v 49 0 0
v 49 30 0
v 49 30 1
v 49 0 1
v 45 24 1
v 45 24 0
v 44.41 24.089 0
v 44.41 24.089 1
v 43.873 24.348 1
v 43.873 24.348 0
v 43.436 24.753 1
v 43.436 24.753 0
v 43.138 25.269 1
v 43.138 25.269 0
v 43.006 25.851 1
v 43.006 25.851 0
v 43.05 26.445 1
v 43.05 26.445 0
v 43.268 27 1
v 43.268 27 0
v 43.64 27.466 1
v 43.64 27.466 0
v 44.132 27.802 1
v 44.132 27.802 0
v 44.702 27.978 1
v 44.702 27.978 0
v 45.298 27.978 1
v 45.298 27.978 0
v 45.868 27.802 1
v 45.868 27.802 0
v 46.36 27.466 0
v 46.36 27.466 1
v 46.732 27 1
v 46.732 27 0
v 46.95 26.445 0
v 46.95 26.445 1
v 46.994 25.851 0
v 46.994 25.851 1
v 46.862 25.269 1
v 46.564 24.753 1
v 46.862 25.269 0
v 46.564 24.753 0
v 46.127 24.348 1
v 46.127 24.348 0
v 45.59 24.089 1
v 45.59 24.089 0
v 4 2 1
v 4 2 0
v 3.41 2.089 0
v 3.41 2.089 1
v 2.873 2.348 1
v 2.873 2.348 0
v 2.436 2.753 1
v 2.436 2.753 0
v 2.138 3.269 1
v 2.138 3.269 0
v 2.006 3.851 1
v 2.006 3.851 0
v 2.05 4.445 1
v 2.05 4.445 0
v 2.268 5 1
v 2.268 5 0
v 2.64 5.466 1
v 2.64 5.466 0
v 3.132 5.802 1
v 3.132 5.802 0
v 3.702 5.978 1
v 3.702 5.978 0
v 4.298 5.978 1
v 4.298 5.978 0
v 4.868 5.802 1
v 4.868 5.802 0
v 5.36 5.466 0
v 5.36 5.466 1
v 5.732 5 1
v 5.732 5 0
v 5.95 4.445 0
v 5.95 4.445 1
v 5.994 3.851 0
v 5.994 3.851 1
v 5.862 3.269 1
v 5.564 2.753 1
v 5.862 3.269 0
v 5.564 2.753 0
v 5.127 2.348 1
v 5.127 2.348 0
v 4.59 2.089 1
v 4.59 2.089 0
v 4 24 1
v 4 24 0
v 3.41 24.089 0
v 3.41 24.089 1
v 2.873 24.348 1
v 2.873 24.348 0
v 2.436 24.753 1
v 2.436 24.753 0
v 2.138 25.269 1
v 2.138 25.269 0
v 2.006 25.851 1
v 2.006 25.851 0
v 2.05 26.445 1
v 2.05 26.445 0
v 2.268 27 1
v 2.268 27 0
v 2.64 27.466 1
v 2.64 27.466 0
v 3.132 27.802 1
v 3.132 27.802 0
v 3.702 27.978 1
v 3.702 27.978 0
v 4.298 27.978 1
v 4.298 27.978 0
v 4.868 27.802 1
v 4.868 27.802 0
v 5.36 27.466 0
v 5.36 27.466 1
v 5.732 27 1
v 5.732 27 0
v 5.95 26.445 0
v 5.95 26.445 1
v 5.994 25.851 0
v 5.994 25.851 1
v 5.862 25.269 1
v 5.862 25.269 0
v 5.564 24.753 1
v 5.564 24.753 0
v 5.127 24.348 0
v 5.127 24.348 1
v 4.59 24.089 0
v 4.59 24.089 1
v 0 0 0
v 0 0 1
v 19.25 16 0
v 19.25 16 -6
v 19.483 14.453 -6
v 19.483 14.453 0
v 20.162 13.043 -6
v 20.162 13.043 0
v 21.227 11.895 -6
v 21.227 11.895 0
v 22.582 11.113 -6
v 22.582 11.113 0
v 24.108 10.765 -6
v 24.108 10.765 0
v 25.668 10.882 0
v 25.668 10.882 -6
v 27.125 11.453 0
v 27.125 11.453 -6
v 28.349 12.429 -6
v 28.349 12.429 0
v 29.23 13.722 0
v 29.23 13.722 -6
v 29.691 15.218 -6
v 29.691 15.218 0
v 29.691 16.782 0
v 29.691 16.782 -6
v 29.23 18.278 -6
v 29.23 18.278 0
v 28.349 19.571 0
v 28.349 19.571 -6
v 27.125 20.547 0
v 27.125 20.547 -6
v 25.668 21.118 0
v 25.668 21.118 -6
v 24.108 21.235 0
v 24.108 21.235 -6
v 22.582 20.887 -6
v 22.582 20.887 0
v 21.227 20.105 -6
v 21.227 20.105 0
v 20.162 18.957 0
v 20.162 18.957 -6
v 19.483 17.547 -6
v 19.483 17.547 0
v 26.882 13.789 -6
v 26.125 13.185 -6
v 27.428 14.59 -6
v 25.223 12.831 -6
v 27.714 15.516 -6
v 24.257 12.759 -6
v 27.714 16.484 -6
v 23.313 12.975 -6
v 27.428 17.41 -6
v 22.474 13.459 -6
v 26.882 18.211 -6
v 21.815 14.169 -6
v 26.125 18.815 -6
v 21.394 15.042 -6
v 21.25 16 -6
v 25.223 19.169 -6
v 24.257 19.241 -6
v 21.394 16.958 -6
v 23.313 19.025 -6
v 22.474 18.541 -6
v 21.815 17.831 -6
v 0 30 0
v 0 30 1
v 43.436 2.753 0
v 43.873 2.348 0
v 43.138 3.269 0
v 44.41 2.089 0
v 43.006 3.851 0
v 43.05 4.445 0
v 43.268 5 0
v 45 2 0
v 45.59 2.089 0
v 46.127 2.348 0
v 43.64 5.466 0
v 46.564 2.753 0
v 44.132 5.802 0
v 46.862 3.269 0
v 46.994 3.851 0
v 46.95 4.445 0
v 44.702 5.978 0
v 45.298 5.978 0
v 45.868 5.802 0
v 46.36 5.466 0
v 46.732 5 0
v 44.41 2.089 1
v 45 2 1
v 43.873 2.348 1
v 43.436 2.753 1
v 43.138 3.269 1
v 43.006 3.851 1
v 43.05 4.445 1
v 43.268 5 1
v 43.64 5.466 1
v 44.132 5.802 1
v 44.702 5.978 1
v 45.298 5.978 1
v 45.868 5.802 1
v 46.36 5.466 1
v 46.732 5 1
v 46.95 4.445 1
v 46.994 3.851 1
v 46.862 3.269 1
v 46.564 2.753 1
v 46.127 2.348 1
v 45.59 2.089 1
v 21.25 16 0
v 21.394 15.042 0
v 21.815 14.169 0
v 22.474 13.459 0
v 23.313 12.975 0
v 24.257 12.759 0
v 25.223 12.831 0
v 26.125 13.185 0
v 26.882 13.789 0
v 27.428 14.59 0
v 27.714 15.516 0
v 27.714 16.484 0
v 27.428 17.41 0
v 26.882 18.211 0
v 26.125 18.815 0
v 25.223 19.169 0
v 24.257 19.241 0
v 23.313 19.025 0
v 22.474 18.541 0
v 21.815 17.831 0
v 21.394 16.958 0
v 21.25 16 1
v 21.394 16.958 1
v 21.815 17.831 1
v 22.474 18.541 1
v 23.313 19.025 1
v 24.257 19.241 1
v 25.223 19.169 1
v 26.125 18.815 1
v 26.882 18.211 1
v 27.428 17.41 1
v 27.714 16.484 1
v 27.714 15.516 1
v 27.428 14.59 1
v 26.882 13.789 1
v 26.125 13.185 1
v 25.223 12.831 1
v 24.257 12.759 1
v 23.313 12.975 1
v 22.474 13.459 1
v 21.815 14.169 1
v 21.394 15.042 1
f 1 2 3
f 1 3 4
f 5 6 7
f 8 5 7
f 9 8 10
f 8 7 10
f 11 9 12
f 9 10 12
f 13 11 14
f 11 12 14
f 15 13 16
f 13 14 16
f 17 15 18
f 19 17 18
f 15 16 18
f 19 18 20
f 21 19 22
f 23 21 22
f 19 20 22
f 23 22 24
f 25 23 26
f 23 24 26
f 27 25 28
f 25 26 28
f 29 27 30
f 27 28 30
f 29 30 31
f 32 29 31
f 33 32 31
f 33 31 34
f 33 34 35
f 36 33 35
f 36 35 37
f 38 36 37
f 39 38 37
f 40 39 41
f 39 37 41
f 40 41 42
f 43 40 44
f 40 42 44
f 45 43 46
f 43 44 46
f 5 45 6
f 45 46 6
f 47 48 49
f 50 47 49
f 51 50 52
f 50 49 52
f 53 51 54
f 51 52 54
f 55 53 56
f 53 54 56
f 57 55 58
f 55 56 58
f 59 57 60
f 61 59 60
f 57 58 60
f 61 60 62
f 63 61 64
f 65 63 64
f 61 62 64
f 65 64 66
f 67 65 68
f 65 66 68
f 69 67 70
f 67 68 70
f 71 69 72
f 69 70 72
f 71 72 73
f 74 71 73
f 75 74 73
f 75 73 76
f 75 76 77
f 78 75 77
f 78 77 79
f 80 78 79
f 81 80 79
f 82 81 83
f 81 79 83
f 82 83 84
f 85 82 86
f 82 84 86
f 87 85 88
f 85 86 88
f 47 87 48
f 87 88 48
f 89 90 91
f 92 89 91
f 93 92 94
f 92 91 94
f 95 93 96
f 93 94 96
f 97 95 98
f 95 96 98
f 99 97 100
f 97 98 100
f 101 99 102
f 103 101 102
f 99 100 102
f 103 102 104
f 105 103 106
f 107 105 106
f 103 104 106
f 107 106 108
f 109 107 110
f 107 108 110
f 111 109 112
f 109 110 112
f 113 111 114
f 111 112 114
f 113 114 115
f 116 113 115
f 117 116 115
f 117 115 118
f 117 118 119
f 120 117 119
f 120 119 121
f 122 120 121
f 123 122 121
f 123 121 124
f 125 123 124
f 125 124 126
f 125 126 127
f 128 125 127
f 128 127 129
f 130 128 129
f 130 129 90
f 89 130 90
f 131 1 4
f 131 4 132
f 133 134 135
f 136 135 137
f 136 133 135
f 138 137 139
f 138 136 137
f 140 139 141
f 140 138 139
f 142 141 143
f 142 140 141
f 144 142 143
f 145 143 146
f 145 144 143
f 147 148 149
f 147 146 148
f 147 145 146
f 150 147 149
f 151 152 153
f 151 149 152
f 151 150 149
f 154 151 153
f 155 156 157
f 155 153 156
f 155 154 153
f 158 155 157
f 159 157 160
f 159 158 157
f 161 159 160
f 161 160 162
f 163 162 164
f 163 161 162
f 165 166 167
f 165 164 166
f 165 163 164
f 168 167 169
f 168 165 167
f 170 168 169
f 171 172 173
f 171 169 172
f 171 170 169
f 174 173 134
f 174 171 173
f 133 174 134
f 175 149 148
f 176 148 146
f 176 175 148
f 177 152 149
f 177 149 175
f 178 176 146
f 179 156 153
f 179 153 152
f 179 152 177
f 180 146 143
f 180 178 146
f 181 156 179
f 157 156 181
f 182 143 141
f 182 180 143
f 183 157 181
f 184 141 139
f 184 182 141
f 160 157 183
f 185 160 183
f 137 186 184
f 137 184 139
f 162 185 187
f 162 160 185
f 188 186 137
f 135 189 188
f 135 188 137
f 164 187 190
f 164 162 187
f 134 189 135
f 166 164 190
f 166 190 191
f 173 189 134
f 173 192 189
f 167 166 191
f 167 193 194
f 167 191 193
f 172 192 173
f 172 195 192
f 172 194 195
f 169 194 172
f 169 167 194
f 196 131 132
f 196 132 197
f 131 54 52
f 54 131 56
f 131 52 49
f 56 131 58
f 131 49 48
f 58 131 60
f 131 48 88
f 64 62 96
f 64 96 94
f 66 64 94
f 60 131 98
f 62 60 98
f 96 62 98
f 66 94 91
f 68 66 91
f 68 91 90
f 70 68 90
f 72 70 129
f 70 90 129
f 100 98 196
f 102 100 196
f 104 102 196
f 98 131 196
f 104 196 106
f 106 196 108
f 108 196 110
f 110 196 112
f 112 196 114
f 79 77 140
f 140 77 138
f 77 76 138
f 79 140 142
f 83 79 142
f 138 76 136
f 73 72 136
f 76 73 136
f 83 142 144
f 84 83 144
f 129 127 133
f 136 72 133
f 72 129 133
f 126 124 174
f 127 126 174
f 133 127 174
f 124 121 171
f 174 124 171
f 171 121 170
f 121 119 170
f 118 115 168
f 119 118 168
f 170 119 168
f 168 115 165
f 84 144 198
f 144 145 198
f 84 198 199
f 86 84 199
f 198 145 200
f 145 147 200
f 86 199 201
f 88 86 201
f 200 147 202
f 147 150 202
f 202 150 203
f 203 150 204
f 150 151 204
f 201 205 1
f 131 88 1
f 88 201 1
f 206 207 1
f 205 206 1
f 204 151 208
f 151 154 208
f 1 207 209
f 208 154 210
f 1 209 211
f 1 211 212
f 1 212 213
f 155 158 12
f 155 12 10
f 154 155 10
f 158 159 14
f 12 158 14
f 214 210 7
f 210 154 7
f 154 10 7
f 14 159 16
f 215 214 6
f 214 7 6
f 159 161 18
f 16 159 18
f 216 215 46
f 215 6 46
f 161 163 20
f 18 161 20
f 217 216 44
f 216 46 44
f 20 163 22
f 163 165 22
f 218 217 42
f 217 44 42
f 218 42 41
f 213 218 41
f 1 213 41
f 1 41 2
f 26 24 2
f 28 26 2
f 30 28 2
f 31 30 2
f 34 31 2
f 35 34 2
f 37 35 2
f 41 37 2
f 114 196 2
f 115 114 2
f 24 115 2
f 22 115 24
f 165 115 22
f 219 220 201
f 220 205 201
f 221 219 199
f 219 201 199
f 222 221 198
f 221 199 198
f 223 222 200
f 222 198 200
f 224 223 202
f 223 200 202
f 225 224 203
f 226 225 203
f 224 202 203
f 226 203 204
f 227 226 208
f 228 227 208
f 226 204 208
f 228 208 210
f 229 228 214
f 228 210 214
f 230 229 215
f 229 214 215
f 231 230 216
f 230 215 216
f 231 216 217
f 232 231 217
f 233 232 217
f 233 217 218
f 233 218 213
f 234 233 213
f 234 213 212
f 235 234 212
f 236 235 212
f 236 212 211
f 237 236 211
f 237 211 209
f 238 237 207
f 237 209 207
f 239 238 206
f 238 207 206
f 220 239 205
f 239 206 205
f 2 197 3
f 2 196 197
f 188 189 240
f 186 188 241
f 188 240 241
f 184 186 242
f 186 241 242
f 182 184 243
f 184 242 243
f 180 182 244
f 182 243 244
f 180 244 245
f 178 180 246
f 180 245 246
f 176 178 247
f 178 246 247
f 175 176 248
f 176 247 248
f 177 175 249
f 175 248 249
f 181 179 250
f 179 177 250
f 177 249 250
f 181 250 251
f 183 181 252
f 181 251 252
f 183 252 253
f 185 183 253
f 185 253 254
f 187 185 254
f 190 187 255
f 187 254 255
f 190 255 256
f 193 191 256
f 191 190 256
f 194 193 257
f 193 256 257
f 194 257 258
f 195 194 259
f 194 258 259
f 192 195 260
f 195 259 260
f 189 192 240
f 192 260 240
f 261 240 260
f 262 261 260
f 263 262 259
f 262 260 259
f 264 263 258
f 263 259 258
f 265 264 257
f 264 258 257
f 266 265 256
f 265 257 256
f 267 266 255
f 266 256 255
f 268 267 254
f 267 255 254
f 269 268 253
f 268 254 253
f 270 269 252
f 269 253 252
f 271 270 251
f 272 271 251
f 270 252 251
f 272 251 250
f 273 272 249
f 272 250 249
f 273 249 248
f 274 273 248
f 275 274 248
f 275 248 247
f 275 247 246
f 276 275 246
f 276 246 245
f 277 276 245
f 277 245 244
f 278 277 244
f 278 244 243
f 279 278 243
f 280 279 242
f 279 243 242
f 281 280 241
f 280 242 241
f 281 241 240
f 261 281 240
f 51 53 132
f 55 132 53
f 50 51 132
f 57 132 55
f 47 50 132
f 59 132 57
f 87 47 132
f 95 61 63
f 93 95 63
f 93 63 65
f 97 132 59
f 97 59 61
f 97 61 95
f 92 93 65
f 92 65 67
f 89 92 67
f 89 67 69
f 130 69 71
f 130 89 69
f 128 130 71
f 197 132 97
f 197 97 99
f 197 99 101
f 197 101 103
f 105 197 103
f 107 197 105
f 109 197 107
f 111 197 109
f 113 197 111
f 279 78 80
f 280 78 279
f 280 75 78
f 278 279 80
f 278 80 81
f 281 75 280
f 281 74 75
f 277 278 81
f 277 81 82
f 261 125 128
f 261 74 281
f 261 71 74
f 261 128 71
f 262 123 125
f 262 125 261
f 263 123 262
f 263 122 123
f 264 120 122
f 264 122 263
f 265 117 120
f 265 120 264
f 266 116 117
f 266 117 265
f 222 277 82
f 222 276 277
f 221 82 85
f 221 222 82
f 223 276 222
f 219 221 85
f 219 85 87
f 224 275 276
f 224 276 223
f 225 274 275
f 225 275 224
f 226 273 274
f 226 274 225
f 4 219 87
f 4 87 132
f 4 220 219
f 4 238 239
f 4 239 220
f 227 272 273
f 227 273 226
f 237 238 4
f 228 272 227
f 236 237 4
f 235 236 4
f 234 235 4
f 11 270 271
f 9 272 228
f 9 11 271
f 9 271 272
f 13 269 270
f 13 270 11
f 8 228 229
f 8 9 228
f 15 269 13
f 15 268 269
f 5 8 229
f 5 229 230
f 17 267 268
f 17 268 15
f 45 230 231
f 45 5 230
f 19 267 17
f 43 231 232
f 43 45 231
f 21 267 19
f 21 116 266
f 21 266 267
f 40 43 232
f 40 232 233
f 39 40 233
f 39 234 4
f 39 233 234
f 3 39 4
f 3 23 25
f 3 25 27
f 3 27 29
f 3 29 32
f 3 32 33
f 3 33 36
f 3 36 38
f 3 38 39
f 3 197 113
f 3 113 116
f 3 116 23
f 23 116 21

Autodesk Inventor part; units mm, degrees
ref_plane "YZ Plane" through (0, 0, 0) normal (1, 0, 0) x (0, 1, 0)
ref_plane "XZ Plane" through (0, 0, 0) normal (0, 1, 0) x (-1, 0, 0)
ref_plane "XY Plane" through (0, 0, 0) normal (0, 0, 1) x (1, 0, 0)
sketch "Skizze1" plane through (0, 0, 0) normal (0, 0, 1) x (1, 0, 0)
  line L0 (0, 30) -> (49, 30)
  line L1 (49, 30) -> (49, 0)
  line L2 (49, 0) -> (0, 0)
  line L3 (0, 0) -> (0, 30)
  line L4 (-9.8, 0) -> (58.8, 0) projected
  line L5 (0, -6) -> (0, 36) projected
  point P0 (0, 0)
  dimension "d0" = 49
  dimension "d1" = 30
extrude "Extrusion1" add sketch "Skizze1" along normal blind 1
sketch "Skizze2" plane through (0, 0, 0) normal (0, 0, -1) x (-1, 0, 0)
  circle A0 centre (-24.5, 16) radius 3.25
  line L0 (-49, 30) -> (0, 30) projected
  line L1 (0, 0) -> (-49, 0) projected
  circle A1 centre (-24.5, 16) radius 5.25
  line L2 (-41, 30) -> (-8, 30)
  line L3 (-8, 30) -> (-8, 2)
  line L4 (-8, 2) -> (-41, 2)
  line L5 (-41, 2) -> (-41, 30)
  line L6 (-49, 0) -> (-49, 30) projected
  line L7 (0, 30) -> (0, 0) projected
  line L8 (-24.5, 30) -> (-24.5, 2)
  dimension "d4" = 6.5
  dimension "d5" = 10.5
  dimension "d8" = 2
  dimension "d9" = 8
  dimension "d10" = 8
  dimension "d11" = 14
extrude "Extrusion2" add sketch "Skizze2" along normal blind 6 contours A0 L8 A1 | A0 L8 A1
sketch "Skizze6" plane through (24.5, 16, 0) normal (0, 0, -1) x (-1, 0, 0)
  circle A0 centre (0, 0) radius 3.25
  circle A1 centre (0, 0) radius 3.25 projected
  point P0 (24.5, -16)
extrude "Extrusion3" cut sketch "Skizze6" against normal through all
sketch "Skizze7" plane through (0, 0, 1) normal (0, 0, 1) x (1, 0, 0)
  line L0 (0, 30) -> (0, 0) projected
  line L1 (49, 30) -> (0, 30) projected
  point P0 (4, 26)
  point P1 (45, 26)
  point P2 (4, 4)
  point P3 (45, 4)
  dimension "d15" = 4
  dimension "d16" = 4
  dimension "d19" = 41
  dimension "d22" = 22
hole "Bohrung1" at (4, 26, 1) at (45, 26, 1) at (4, 4, 1) at (45, 4, 1) direction (0, 0, -1) diameter 4 end through all
properties part number "RE-Halter"
